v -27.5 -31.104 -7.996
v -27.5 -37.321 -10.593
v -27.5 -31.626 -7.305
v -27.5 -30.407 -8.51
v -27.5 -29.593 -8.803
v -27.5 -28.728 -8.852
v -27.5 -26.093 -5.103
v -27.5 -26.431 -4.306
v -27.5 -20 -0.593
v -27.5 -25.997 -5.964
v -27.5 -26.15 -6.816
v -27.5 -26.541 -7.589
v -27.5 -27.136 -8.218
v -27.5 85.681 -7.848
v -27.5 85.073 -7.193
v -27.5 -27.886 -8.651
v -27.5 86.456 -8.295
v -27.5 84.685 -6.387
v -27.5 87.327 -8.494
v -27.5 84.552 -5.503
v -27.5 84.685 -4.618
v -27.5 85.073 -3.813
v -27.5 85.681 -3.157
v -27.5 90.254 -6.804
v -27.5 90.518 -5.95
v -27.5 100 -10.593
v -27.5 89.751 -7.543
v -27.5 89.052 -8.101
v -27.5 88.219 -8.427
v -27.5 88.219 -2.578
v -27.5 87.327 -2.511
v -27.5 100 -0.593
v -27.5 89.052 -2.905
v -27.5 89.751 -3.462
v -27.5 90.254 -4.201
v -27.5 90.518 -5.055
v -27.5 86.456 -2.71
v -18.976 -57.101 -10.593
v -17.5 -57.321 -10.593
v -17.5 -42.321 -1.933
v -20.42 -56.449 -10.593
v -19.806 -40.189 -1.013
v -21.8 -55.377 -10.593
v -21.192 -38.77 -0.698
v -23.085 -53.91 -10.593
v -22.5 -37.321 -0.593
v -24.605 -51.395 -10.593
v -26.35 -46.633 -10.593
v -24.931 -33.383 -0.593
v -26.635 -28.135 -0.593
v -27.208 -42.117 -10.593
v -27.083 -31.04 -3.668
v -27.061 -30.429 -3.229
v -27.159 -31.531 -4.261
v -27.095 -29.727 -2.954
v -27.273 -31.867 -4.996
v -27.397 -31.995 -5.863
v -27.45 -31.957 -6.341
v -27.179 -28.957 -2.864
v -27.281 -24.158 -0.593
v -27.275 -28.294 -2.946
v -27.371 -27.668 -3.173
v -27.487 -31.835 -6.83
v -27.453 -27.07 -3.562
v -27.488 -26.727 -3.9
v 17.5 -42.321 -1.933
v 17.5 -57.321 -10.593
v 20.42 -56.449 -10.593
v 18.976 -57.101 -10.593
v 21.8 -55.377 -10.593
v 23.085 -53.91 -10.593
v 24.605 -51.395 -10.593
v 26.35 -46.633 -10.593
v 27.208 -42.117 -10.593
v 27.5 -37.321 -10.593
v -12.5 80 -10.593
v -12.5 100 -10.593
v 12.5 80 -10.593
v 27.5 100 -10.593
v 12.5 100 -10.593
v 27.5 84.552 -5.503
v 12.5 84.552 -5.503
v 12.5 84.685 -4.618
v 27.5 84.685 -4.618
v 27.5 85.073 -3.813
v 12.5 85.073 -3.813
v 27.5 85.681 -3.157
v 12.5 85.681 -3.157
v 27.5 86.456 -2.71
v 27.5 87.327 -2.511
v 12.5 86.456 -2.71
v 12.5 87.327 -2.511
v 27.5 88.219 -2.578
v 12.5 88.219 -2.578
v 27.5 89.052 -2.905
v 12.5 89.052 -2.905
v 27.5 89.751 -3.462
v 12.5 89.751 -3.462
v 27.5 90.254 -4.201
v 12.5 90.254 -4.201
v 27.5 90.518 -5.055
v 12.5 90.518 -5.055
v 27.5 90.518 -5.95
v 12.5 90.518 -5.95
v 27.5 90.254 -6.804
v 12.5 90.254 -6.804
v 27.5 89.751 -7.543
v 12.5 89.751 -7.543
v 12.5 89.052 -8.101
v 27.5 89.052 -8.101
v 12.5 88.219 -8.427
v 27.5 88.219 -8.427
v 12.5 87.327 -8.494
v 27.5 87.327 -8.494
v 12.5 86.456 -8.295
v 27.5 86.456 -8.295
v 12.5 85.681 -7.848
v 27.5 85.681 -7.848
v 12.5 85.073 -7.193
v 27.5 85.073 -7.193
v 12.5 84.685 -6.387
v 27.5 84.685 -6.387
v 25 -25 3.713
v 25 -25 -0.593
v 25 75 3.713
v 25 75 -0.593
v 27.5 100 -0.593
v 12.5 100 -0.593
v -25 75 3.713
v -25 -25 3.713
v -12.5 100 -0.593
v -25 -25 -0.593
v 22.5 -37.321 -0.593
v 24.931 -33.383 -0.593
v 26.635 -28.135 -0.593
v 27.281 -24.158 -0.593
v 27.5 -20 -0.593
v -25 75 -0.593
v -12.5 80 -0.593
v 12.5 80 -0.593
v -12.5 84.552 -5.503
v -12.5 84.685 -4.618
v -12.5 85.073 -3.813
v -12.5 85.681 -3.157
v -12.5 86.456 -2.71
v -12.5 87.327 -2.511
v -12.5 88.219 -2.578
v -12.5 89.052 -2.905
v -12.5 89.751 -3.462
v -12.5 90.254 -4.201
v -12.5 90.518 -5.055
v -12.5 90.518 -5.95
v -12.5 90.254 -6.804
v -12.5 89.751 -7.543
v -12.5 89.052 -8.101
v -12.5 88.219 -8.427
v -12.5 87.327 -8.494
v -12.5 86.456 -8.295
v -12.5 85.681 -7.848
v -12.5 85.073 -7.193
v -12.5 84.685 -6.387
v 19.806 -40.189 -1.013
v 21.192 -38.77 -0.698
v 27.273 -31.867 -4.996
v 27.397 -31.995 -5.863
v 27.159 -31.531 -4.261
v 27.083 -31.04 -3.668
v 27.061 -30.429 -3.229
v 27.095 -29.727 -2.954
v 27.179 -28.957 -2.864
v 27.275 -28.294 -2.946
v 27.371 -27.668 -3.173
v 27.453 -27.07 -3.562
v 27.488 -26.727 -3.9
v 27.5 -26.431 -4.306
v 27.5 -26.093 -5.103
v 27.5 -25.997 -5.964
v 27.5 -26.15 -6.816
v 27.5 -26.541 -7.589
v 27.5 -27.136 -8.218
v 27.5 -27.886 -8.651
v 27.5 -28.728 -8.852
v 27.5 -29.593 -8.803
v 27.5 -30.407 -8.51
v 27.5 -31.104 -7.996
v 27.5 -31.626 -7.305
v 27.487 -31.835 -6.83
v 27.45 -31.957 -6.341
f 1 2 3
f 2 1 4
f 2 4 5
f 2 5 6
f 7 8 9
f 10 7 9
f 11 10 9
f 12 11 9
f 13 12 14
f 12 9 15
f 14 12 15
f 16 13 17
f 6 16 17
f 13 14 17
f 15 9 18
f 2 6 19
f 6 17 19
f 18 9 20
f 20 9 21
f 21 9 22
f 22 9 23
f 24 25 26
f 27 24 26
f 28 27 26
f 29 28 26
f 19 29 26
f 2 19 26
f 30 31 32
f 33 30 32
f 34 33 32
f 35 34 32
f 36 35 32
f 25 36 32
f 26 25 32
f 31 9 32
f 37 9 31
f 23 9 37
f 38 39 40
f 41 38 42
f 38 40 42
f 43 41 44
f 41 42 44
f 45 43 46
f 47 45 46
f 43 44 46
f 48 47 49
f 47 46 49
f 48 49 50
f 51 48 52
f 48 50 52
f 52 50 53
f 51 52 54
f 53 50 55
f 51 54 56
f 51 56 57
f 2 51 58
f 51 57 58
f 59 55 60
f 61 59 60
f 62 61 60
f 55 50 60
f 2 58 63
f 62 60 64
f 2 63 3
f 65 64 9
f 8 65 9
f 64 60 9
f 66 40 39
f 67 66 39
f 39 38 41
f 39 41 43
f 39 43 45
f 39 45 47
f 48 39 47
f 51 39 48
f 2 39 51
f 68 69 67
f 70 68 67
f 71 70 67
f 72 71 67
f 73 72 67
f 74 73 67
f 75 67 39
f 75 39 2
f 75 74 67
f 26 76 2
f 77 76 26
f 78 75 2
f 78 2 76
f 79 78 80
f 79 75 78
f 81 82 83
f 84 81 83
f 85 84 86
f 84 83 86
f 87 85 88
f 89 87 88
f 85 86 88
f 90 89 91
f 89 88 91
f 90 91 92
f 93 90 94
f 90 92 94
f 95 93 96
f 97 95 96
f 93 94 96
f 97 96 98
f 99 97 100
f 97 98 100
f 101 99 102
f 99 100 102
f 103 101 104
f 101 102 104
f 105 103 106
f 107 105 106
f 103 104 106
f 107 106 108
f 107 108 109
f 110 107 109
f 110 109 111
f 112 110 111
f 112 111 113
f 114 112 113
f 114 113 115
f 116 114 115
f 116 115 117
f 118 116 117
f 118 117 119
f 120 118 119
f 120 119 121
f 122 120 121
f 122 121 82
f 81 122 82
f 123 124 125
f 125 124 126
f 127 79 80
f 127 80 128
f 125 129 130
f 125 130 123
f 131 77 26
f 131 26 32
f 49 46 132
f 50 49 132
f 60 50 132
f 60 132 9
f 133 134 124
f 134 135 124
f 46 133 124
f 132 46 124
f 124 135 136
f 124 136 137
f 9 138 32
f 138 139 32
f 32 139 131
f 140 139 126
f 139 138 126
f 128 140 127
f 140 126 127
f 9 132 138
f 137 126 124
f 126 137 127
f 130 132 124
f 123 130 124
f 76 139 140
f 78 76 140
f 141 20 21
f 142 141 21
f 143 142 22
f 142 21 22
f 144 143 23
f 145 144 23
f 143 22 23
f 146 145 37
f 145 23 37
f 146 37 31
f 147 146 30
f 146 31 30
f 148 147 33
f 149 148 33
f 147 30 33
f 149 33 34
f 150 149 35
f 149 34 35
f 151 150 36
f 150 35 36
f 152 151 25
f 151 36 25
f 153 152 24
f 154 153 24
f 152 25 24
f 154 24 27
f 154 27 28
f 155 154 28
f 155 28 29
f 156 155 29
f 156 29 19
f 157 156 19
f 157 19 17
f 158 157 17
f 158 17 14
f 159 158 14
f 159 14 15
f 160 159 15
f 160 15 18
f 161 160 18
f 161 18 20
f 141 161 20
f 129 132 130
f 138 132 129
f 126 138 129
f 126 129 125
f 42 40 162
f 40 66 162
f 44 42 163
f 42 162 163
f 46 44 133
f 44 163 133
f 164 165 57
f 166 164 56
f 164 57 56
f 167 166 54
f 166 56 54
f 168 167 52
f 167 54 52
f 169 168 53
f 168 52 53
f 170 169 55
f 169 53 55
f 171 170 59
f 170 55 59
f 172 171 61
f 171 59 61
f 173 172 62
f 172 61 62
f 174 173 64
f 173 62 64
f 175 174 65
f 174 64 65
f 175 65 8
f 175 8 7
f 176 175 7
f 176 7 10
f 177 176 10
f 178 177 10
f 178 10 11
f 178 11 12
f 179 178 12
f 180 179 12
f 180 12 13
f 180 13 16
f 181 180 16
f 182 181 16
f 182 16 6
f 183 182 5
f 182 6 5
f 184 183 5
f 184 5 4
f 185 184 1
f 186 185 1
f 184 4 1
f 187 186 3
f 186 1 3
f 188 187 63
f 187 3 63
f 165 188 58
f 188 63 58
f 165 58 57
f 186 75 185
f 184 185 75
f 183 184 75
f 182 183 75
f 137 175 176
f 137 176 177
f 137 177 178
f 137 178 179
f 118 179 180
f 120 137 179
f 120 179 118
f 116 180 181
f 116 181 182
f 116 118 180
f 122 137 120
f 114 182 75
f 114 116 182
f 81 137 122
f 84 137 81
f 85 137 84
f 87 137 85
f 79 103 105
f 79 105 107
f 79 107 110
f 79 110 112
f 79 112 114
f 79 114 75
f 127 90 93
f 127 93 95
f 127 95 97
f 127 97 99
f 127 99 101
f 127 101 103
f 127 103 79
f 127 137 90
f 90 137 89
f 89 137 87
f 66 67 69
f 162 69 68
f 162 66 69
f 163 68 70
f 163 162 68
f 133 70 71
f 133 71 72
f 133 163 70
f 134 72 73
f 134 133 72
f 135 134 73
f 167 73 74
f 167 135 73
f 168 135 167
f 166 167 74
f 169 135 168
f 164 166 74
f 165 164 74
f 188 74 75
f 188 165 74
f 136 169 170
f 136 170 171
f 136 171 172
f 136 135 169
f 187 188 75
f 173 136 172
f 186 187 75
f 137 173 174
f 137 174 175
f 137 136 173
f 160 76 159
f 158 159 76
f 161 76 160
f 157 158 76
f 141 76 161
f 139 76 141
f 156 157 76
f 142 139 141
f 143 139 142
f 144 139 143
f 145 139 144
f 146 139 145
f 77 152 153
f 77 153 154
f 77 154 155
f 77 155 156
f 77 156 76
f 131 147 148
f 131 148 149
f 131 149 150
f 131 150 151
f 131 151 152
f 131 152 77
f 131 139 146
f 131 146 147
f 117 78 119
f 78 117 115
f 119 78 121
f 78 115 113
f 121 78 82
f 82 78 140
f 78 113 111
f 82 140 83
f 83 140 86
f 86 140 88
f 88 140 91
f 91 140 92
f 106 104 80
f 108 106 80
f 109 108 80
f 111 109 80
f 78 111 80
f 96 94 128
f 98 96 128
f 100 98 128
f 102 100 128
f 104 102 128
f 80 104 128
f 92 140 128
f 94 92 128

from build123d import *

# Parameters (mm, degrees)
F0_W        = 180
F0_H        = 10
F1_DEPTH    = 27.5
F2_T1_DEPTH = 261.9668603717
F3_R        = 10
F4_W        = 50
F4_H        = 100
F5_DEPTH    = 4.30577
F6_W        = 25
F6_H        = 20
F7_DEPTH    = 25
F9_D        = 6
F10_D       = 6


# Not quite as in the source:
# - a fillet or chamfer that OpenCascade refuses, or shapes differently, is made with other operations: its cross-section is extruded or revolved along the edge and cut away or added


with BuildPart() as f1:
    # F0 (on Right) → F1 (new body, symmetric)
    with BuildSketch(Plane.YZ):
        with Locations((10, -5.5927829817)):
            Rectangle(F0_W, F0_H)
    extrude(amount=F1_DEPTH, both=True)

    # F2: chamfer of 40 x 23.0940107676 on 1 edges, made by hand

    # F2_s2 → F2_t1 (cut)
    with BuildSketch(Plane.YZ.offset(-130.9834301858)):
        Polygon((-40, -0.5927829817), (-80, -23.6867937493), (-80, -0.5927829817), align=None)
    extrude(amount=F2_T1_DEPTH, mode=Mode.SUBTRACT)

    # F3
    f3_edges = [f1.edges().sort_by_distance(p)[0] for p in [
        (-27.5, -48.660254, -5.592783),
        (27.5, -48.660254, -5.592783),
        (0, -40, -0.592783),
    ]]
    fillet(f3_edges, radius=F3_R)

    # F4 (on face) → F5 (join)
    with BuildSketch(Plane.XY.offset(-0.5927829817)):
        with Locations((0, 25)):
            Rectangle(F4_W, F4_H)
    extrude(amount=F5_DEPTH)

    # F6 (on face) → F7 (cut)
    with BuildSketch(Plane.XY.offset(-0.5927829817)):
        with Locations((0, 90)):
            Rectangle(F6_W, F6_H)
    extrude(amount=-F7_DEPTH, mode=Mode.SUBTRACT)

    # F9 (through all)
    with Locations(Plane.YZ.offset(27.5)):
        with Locations((-28.9948489517, -5.8634025045)):
            Hole(F9_D / 2)

    # F10 (through all)
    with Locations(Plane.YZ.offset(27.5)):
        with Locations((87.551549077, -5.5025774054)):
            Hole(F10_D / 2)


solid = f1.part
